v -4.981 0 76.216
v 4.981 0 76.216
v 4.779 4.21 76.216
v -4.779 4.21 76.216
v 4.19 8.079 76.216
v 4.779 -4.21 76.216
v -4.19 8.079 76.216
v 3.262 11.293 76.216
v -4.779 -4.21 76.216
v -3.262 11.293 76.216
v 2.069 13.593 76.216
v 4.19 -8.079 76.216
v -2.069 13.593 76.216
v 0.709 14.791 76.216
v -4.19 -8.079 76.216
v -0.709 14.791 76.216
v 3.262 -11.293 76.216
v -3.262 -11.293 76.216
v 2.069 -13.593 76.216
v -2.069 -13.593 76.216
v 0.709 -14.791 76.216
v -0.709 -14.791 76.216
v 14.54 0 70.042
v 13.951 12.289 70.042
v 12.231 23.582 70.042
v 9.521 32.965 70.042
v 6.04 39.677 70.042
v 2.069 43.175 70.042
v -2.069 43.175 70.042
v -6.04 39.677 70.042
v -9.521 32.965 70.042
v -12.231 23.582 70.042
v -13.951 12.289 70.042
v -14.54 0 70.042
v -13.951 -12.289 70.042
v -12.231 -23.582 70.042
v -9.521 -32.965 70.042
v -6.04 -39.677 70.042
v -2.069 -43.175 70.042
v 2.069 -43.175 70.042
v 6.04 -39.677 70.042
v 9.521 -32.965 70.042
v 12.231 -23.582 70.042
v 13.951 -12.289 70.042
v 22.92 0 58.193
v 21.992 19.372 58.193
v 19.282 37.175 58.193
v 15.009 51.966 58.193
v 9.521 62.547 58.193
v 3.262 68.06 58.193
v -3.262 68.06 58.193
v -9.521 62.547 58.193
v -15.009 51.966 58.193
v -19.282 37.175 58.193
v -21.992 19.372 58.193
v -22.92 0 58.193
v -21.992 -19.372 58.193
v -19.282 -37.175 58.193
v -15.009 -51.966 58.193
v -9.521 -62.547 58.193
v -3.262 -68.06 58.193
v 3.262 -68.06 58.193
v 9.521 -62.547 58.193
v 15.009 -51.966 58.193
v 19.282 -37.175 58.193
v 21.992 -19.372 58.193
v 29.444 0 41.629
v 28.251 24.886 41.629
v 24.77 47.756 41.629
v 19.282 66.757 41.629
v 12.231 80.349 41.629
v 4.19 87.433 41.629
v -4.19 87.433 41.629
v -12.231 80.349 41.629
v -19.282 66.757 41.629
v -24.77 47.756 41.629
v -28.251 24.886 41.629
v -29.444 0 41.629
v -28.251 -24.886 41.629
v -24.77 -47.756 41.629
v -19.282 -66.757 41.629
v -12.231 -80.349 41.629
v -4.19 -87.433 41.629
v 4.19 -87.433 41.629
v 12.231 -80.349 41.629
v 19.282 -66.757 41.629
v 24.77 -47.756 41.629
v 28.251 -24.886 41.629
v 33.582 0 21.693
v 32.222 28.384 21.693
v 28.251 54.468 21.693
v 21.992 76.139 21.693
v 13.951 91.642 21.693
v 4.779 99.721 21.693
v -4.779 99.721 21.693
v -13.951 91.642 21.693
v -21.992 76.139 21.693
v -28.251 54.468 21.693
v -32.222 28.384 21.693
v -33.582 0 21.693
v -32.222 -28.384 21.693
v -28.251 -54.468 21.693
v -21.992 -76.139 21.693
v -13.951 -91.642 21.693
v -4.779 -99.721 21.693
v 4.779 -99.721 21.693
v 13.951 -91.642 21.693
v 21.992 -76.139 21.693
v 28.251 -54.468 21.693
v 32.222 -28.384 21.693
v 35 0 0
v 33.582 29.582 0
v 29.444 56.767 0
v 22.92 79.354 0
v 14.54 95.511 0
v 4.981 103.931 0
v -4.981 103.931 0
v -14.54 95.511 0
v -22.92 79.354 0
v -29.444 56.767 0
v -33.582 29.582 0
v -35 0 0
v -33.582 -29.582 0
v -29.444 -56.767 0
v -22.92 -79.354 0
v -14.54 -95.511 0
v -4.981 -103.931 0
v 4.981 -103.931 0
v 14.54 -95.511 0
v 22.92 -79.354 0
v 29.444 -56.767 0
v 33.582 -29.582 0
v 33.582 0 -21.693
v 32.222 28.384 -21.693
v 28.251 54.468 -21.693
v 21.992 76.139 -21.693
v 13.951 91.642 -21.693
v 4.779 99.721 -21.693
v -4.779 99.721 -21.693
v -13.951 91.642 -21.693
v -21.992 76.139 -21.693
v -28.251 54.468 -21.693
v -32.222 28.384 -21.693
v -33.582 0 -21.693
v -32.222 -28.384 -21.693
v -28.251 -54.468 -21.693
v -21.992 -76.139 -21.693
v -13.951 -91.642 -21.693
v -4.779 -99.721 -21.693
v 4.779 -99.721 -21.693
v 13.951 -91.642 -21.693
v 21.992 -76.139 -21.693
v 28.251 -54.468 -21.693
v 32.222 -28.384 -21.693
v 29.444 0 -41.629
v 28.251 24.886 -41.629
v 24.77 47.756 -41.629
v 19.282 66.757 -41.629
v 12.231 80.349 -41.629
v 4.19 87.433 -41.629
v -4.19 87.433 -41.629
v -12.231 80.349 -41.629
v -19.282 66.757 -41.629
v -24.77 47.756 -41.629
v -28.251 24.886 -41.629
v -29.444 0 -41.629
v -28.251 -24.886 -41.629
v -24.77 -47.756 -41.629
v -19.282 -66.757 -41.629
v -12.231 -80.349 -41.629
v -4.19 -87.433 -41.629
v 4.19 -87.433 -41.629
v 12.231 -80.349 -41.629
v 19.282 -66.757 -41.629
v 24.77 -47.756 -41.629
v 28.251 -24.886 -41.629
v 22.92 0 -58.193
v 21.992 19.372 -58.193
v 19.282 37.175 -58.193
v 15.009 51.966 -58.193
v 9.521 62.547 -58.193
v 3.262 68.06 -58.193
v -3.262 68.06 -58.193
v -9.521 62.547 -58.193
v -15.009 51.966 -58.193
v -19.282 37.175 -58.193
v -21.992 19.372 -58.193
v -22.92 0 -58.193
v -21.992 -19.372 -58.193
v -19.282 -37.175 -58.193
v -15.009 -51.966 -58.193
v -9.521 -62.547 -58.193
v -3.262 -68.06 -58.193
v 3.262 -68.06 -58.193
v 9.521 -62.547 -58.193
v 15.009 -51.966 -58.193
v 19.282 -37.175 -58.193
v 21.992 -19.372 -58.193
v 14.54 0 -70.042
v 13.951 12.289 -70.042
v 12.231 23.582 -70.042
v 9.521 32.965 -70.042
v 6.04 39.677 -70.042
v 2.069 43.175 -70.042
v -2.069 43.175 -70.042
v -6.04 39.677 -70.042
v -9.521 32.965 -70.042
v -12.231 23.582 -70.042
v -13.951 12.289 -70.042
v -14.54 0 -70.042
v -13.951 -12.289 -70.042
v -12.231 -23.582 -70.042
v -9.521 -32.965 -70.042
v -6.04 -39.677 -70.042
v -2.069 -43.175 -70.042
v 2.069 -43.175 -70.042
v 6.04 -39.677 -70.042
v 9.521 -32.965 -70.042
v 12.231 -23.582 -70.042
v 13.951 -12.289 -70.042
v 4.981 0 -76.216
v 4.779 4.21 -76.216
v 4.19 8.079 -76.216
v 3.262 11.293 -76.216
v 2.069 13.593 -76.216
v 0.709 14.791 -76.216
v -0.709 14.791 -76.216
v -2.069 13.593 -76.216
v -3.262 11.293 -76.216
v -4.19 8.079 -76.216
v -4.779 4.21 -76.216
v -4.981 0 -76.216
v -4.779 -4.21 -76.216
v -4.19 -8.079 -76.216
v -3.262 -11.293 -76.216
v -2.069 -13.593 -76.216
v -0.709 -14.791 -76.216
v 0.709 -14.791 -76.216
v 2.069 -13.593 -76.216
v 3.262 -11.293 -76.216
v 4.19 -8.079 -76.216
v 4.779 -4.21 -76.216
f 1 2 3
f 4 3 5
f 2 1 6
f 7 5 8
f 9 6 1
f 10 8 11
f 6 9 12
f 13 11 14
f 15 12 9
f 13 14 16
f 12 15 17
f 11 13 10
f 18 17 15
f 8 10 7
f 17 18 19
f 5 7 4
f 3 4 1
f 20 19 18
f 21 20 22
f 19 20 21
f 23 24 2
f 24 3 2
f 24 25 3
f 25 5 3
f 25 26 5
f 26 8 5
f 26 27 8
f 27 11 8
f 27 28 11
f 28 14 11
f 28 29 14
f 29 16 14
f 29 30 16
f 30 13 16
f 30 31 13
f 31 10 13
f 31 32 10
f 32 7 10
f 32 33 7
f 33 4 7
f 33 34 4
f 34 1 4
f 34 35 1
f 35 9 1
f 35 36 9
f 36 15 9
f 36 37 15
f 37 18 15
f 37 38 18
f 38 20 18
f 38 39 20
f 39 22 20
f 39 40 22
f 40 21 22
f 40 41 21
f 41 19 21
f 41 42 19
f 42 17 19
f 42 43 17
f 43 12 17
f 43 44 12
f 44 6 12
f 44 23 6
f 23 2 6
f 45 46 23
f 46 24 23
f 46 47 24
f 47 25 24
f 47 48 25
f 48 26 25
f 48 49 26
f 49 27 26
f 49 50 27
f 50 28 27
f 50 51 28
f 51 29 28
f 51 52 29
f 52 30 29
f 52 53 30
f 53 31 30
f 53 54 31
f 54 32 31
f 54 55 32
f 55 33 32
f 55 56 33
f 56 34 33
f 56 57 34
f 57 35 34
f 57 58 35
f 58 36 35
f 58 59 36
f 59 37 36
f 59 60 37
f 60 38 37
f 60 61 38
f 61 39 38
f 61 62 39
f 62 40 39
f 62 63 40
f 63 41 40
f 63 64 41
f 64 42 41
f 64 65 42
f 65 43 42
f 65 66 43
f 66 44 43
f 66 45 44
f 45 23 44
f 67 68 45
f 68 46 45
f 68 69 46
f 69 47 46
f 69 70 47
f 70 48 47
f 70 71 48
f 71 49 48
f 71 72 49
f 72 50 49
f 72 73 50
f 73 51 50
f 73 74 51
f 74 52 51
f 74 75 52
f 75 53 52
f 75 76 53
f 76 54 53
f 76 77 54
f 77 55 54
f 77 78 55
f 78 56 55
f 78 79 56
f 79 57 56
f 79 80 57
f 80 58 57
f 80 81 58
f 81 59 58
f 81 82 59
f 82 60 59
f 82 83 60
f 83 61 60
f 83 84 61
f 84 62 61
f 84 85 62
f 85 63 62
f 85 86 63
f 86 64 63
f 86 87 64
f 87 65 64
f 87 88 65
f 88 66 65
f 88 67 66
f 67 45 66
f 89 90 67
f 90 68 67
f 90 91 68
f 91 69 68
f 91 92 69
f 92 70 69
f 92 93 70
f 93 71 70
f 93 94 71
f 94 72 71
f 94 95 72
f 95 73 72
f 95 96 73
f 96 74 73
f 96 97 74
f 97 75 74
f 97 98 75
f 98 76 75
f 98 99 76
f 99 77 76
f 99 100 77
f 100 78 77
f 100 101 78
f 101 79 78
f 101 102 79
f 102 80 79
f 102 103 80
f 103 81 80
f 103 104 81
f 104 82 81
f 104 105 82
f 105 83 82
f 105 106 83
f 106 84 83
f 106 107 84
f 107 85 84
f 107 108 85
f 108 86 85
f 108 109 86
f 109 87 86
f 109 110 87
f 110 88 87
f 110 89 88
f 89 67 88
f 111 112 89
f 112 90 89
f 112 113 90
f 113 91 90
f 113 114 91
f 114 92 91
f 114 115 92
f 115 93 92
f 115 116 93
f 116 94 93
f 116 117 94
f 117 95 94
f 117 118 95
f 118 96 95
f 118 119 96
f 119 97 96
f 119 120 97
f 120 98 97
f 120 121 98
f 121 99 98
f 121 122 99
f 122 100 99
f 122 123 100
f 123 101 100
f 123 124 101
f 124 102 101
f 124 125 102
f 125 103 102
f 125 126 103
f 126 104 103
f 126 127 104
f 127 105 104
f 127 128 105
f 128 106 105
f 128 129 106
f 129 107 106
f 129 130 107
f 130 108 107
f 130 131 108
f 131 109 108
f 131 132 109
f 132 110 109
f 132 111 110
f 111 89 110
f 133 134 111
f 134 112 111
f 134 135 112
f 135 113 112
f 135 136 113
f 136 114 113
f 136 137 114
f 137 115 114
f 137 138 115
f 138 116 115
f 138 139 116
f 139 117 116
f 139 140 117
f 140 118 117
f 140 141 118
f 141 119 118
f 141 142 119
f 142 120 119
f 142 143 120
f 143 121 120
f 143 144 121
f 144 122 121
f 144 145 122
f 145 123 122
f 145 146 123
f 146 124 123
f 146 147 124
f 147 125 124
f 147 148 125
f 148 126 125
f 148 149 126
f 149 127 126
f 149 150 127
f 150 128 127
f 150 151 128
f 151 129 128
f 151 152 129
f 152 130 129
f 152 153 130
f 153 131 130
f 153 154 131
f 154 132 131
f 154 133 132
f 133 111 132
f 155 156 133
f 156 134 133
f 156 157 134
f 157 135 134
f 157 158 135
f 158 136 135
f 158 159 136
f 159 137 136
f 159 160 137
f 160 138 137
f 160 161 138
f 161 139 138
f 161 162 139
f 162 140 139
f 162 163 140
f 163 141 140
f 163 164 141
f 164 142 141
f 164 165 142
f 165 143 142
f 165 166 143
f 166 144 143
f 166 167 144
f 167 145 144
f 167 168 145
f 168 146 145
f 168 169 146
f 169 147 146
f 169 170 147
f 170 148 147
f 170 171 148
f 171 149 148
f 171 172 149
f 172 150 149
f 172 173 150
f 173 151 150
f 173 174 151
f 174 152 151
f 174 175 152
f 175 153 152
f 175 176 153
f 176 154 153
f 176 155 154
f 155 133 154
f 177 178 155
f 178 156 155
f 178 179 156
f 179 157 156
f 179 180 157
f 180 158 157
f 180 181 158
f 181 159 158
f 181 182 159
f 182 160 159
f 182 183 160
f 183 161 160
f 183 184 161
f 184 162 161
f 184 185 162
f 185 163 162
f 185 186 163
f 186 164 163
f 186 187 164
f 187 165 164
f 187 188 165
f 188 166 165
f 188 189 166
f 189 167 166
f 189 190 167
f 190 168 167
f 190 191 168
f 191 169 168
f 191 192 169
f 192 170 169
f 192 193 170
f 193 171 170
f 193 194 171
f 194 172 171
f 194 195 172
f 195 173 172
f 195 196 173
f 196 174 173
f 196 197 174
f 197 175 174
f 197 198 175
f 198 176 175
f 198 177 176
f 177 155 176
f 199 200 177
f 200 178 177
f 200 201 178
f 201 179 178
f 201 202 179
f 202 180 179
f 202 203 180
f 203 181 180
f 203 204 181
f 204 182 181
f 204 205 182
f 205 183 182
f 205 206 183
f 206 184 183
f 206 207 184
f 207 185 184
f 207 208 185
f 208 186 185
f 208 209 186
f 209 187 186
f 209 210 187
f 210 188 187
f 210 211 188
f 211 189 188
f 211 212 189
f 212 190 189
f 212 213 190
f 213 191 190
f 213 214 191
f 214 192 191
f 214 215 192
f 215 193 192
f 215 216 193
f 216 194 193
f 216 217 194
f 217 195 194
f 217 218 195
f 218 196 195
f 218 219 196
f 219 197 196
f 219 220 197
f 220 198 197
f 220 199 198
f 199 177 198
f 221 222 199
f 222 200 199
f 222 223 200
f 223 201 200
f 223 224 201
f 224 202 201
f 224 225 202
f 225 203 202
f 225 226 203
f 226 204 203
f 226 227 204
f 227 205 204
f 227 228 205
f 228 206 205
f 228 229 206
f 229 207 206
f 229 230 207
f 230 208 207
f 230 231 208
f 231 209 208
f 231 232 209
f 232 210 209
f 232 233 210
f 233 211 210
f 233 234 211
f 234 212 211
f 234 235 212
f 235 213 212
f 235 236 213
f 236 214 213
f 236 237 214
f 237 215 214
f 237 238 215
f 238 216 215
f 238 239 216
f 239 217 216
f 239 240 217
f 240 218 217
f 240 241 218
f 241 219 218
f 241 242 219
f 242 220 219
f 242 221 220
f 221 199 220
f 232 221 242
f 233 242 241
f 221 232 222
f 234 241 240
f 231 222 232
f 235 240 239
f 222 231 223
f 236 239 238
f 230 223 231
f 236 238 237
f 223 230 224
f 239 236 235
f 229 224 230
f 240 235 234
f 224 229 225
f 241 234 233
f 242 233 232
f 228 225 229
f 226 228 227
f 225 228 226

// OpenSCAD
// Generated by SolidPython 1.0.1 on 2020-07-29 00:46:46


scale(v = [5, 15, 11]) {
	sphere(r = 7);
}
/***********************************************
*********      SolidPython code:      **********
************************************************
 
# import packages: SolidPython
from solid import *
from solid.utils import *
from itertools import chain, combinations, permutations


class Resize:

    def __init__(self, scad_file):
        self.scad_file = scad_file
        #self.scad_file = import_scad(scad_file)
        # cone/cylinder param:
        self.r1 = 0
        self.r2 = 0
        self.h = 0
        # rectangular prism param:
        self.w = 0
        self.l = 0
        # ellipse param:
        self.r = 0

    # import OpenScad code (file name corresponds to shape)


    # classify shape + parameters
    def assign(self, param1, param2, param3):
        if self.scad_file == 'cone.scad':
            self.r1 = param1
            self.r2 = param2
            self.h = param3
        elif self.scad_file == 'cylinder.scad':
            self.r1 = param1
            self.r2 = param2
            self.h = param3
        elif self.scad_file == 'rectangularPrism.scad':
            self.h = param1
            self.l = param2
            self.w = param3
        else:
            self.r = param1
            self.h = param2

    # resize parameters
    def iterate(self):
        x = range(3, 20, 2)
        i = 1
        if self.scad_file == 'cone.scad':
            tempList = list(permutations(x, 2))
            for temp in tempList:
                param1 = temp[0]
                param2 = temp[1]
                filepath = 'produced_scad_files/' + 'cone' + str(param1) + '_' + str(param2) + '_' + '.scad'
                scad_render_to_file(cylinder(h=param1, r1=param2, r2=0), filepath)

        elif self.scad_file == 'cylinder.scad':
            tempList = list(permutations(x, 3))
            for temp in tempList:
                param1 = temp[0]
                param2 = temp[1]
                filepath = 'produced_scad_files/' + 'cylinder' + str(param1) + '_' + str(param2) + '_' + '.scad'
                scad_render_to_file(cylinder(h=param1, r1=param2, r2=param2), filepath)

        elif self.scad_file == 'rectangularPrism.scad':
            tempList = list(permutations(x, 3))
            for temp in tempList:
                param1 = temp[0]
                param2 = temp[1]
                param3 = temp[2]
                filepath = 'produced_scad_files/' + 'rectangularPrism' + str(param1) + '_' + str(param2) + '_' + str(
                    param3) + '.scad'
                scad_render_to_file(cube(size=(param1, param2, param3)), filepath)

        elif self.scad_file == 'ellipse.scad':
            tempList = list(permutations(x, 4))
            for temp in tempList:
                param1 = temp[0]
                param2 = temp[1]
                param3 = temp[2]
                param4 = temp[3]
                filepath = 'produced_scad_files/' + 'ellipse' + str(param1) + '_' + str(param2) + '_' + str(param3) + '_' + str(param4) + '.scad'
                scad_render_to_file(scale([param1, param2, param3])(sphere(r=param4)), filepath)

    def render_to_scadfile(self):
        scad_render_to_file(scad, 'example.scad') 
 
************************************************/
